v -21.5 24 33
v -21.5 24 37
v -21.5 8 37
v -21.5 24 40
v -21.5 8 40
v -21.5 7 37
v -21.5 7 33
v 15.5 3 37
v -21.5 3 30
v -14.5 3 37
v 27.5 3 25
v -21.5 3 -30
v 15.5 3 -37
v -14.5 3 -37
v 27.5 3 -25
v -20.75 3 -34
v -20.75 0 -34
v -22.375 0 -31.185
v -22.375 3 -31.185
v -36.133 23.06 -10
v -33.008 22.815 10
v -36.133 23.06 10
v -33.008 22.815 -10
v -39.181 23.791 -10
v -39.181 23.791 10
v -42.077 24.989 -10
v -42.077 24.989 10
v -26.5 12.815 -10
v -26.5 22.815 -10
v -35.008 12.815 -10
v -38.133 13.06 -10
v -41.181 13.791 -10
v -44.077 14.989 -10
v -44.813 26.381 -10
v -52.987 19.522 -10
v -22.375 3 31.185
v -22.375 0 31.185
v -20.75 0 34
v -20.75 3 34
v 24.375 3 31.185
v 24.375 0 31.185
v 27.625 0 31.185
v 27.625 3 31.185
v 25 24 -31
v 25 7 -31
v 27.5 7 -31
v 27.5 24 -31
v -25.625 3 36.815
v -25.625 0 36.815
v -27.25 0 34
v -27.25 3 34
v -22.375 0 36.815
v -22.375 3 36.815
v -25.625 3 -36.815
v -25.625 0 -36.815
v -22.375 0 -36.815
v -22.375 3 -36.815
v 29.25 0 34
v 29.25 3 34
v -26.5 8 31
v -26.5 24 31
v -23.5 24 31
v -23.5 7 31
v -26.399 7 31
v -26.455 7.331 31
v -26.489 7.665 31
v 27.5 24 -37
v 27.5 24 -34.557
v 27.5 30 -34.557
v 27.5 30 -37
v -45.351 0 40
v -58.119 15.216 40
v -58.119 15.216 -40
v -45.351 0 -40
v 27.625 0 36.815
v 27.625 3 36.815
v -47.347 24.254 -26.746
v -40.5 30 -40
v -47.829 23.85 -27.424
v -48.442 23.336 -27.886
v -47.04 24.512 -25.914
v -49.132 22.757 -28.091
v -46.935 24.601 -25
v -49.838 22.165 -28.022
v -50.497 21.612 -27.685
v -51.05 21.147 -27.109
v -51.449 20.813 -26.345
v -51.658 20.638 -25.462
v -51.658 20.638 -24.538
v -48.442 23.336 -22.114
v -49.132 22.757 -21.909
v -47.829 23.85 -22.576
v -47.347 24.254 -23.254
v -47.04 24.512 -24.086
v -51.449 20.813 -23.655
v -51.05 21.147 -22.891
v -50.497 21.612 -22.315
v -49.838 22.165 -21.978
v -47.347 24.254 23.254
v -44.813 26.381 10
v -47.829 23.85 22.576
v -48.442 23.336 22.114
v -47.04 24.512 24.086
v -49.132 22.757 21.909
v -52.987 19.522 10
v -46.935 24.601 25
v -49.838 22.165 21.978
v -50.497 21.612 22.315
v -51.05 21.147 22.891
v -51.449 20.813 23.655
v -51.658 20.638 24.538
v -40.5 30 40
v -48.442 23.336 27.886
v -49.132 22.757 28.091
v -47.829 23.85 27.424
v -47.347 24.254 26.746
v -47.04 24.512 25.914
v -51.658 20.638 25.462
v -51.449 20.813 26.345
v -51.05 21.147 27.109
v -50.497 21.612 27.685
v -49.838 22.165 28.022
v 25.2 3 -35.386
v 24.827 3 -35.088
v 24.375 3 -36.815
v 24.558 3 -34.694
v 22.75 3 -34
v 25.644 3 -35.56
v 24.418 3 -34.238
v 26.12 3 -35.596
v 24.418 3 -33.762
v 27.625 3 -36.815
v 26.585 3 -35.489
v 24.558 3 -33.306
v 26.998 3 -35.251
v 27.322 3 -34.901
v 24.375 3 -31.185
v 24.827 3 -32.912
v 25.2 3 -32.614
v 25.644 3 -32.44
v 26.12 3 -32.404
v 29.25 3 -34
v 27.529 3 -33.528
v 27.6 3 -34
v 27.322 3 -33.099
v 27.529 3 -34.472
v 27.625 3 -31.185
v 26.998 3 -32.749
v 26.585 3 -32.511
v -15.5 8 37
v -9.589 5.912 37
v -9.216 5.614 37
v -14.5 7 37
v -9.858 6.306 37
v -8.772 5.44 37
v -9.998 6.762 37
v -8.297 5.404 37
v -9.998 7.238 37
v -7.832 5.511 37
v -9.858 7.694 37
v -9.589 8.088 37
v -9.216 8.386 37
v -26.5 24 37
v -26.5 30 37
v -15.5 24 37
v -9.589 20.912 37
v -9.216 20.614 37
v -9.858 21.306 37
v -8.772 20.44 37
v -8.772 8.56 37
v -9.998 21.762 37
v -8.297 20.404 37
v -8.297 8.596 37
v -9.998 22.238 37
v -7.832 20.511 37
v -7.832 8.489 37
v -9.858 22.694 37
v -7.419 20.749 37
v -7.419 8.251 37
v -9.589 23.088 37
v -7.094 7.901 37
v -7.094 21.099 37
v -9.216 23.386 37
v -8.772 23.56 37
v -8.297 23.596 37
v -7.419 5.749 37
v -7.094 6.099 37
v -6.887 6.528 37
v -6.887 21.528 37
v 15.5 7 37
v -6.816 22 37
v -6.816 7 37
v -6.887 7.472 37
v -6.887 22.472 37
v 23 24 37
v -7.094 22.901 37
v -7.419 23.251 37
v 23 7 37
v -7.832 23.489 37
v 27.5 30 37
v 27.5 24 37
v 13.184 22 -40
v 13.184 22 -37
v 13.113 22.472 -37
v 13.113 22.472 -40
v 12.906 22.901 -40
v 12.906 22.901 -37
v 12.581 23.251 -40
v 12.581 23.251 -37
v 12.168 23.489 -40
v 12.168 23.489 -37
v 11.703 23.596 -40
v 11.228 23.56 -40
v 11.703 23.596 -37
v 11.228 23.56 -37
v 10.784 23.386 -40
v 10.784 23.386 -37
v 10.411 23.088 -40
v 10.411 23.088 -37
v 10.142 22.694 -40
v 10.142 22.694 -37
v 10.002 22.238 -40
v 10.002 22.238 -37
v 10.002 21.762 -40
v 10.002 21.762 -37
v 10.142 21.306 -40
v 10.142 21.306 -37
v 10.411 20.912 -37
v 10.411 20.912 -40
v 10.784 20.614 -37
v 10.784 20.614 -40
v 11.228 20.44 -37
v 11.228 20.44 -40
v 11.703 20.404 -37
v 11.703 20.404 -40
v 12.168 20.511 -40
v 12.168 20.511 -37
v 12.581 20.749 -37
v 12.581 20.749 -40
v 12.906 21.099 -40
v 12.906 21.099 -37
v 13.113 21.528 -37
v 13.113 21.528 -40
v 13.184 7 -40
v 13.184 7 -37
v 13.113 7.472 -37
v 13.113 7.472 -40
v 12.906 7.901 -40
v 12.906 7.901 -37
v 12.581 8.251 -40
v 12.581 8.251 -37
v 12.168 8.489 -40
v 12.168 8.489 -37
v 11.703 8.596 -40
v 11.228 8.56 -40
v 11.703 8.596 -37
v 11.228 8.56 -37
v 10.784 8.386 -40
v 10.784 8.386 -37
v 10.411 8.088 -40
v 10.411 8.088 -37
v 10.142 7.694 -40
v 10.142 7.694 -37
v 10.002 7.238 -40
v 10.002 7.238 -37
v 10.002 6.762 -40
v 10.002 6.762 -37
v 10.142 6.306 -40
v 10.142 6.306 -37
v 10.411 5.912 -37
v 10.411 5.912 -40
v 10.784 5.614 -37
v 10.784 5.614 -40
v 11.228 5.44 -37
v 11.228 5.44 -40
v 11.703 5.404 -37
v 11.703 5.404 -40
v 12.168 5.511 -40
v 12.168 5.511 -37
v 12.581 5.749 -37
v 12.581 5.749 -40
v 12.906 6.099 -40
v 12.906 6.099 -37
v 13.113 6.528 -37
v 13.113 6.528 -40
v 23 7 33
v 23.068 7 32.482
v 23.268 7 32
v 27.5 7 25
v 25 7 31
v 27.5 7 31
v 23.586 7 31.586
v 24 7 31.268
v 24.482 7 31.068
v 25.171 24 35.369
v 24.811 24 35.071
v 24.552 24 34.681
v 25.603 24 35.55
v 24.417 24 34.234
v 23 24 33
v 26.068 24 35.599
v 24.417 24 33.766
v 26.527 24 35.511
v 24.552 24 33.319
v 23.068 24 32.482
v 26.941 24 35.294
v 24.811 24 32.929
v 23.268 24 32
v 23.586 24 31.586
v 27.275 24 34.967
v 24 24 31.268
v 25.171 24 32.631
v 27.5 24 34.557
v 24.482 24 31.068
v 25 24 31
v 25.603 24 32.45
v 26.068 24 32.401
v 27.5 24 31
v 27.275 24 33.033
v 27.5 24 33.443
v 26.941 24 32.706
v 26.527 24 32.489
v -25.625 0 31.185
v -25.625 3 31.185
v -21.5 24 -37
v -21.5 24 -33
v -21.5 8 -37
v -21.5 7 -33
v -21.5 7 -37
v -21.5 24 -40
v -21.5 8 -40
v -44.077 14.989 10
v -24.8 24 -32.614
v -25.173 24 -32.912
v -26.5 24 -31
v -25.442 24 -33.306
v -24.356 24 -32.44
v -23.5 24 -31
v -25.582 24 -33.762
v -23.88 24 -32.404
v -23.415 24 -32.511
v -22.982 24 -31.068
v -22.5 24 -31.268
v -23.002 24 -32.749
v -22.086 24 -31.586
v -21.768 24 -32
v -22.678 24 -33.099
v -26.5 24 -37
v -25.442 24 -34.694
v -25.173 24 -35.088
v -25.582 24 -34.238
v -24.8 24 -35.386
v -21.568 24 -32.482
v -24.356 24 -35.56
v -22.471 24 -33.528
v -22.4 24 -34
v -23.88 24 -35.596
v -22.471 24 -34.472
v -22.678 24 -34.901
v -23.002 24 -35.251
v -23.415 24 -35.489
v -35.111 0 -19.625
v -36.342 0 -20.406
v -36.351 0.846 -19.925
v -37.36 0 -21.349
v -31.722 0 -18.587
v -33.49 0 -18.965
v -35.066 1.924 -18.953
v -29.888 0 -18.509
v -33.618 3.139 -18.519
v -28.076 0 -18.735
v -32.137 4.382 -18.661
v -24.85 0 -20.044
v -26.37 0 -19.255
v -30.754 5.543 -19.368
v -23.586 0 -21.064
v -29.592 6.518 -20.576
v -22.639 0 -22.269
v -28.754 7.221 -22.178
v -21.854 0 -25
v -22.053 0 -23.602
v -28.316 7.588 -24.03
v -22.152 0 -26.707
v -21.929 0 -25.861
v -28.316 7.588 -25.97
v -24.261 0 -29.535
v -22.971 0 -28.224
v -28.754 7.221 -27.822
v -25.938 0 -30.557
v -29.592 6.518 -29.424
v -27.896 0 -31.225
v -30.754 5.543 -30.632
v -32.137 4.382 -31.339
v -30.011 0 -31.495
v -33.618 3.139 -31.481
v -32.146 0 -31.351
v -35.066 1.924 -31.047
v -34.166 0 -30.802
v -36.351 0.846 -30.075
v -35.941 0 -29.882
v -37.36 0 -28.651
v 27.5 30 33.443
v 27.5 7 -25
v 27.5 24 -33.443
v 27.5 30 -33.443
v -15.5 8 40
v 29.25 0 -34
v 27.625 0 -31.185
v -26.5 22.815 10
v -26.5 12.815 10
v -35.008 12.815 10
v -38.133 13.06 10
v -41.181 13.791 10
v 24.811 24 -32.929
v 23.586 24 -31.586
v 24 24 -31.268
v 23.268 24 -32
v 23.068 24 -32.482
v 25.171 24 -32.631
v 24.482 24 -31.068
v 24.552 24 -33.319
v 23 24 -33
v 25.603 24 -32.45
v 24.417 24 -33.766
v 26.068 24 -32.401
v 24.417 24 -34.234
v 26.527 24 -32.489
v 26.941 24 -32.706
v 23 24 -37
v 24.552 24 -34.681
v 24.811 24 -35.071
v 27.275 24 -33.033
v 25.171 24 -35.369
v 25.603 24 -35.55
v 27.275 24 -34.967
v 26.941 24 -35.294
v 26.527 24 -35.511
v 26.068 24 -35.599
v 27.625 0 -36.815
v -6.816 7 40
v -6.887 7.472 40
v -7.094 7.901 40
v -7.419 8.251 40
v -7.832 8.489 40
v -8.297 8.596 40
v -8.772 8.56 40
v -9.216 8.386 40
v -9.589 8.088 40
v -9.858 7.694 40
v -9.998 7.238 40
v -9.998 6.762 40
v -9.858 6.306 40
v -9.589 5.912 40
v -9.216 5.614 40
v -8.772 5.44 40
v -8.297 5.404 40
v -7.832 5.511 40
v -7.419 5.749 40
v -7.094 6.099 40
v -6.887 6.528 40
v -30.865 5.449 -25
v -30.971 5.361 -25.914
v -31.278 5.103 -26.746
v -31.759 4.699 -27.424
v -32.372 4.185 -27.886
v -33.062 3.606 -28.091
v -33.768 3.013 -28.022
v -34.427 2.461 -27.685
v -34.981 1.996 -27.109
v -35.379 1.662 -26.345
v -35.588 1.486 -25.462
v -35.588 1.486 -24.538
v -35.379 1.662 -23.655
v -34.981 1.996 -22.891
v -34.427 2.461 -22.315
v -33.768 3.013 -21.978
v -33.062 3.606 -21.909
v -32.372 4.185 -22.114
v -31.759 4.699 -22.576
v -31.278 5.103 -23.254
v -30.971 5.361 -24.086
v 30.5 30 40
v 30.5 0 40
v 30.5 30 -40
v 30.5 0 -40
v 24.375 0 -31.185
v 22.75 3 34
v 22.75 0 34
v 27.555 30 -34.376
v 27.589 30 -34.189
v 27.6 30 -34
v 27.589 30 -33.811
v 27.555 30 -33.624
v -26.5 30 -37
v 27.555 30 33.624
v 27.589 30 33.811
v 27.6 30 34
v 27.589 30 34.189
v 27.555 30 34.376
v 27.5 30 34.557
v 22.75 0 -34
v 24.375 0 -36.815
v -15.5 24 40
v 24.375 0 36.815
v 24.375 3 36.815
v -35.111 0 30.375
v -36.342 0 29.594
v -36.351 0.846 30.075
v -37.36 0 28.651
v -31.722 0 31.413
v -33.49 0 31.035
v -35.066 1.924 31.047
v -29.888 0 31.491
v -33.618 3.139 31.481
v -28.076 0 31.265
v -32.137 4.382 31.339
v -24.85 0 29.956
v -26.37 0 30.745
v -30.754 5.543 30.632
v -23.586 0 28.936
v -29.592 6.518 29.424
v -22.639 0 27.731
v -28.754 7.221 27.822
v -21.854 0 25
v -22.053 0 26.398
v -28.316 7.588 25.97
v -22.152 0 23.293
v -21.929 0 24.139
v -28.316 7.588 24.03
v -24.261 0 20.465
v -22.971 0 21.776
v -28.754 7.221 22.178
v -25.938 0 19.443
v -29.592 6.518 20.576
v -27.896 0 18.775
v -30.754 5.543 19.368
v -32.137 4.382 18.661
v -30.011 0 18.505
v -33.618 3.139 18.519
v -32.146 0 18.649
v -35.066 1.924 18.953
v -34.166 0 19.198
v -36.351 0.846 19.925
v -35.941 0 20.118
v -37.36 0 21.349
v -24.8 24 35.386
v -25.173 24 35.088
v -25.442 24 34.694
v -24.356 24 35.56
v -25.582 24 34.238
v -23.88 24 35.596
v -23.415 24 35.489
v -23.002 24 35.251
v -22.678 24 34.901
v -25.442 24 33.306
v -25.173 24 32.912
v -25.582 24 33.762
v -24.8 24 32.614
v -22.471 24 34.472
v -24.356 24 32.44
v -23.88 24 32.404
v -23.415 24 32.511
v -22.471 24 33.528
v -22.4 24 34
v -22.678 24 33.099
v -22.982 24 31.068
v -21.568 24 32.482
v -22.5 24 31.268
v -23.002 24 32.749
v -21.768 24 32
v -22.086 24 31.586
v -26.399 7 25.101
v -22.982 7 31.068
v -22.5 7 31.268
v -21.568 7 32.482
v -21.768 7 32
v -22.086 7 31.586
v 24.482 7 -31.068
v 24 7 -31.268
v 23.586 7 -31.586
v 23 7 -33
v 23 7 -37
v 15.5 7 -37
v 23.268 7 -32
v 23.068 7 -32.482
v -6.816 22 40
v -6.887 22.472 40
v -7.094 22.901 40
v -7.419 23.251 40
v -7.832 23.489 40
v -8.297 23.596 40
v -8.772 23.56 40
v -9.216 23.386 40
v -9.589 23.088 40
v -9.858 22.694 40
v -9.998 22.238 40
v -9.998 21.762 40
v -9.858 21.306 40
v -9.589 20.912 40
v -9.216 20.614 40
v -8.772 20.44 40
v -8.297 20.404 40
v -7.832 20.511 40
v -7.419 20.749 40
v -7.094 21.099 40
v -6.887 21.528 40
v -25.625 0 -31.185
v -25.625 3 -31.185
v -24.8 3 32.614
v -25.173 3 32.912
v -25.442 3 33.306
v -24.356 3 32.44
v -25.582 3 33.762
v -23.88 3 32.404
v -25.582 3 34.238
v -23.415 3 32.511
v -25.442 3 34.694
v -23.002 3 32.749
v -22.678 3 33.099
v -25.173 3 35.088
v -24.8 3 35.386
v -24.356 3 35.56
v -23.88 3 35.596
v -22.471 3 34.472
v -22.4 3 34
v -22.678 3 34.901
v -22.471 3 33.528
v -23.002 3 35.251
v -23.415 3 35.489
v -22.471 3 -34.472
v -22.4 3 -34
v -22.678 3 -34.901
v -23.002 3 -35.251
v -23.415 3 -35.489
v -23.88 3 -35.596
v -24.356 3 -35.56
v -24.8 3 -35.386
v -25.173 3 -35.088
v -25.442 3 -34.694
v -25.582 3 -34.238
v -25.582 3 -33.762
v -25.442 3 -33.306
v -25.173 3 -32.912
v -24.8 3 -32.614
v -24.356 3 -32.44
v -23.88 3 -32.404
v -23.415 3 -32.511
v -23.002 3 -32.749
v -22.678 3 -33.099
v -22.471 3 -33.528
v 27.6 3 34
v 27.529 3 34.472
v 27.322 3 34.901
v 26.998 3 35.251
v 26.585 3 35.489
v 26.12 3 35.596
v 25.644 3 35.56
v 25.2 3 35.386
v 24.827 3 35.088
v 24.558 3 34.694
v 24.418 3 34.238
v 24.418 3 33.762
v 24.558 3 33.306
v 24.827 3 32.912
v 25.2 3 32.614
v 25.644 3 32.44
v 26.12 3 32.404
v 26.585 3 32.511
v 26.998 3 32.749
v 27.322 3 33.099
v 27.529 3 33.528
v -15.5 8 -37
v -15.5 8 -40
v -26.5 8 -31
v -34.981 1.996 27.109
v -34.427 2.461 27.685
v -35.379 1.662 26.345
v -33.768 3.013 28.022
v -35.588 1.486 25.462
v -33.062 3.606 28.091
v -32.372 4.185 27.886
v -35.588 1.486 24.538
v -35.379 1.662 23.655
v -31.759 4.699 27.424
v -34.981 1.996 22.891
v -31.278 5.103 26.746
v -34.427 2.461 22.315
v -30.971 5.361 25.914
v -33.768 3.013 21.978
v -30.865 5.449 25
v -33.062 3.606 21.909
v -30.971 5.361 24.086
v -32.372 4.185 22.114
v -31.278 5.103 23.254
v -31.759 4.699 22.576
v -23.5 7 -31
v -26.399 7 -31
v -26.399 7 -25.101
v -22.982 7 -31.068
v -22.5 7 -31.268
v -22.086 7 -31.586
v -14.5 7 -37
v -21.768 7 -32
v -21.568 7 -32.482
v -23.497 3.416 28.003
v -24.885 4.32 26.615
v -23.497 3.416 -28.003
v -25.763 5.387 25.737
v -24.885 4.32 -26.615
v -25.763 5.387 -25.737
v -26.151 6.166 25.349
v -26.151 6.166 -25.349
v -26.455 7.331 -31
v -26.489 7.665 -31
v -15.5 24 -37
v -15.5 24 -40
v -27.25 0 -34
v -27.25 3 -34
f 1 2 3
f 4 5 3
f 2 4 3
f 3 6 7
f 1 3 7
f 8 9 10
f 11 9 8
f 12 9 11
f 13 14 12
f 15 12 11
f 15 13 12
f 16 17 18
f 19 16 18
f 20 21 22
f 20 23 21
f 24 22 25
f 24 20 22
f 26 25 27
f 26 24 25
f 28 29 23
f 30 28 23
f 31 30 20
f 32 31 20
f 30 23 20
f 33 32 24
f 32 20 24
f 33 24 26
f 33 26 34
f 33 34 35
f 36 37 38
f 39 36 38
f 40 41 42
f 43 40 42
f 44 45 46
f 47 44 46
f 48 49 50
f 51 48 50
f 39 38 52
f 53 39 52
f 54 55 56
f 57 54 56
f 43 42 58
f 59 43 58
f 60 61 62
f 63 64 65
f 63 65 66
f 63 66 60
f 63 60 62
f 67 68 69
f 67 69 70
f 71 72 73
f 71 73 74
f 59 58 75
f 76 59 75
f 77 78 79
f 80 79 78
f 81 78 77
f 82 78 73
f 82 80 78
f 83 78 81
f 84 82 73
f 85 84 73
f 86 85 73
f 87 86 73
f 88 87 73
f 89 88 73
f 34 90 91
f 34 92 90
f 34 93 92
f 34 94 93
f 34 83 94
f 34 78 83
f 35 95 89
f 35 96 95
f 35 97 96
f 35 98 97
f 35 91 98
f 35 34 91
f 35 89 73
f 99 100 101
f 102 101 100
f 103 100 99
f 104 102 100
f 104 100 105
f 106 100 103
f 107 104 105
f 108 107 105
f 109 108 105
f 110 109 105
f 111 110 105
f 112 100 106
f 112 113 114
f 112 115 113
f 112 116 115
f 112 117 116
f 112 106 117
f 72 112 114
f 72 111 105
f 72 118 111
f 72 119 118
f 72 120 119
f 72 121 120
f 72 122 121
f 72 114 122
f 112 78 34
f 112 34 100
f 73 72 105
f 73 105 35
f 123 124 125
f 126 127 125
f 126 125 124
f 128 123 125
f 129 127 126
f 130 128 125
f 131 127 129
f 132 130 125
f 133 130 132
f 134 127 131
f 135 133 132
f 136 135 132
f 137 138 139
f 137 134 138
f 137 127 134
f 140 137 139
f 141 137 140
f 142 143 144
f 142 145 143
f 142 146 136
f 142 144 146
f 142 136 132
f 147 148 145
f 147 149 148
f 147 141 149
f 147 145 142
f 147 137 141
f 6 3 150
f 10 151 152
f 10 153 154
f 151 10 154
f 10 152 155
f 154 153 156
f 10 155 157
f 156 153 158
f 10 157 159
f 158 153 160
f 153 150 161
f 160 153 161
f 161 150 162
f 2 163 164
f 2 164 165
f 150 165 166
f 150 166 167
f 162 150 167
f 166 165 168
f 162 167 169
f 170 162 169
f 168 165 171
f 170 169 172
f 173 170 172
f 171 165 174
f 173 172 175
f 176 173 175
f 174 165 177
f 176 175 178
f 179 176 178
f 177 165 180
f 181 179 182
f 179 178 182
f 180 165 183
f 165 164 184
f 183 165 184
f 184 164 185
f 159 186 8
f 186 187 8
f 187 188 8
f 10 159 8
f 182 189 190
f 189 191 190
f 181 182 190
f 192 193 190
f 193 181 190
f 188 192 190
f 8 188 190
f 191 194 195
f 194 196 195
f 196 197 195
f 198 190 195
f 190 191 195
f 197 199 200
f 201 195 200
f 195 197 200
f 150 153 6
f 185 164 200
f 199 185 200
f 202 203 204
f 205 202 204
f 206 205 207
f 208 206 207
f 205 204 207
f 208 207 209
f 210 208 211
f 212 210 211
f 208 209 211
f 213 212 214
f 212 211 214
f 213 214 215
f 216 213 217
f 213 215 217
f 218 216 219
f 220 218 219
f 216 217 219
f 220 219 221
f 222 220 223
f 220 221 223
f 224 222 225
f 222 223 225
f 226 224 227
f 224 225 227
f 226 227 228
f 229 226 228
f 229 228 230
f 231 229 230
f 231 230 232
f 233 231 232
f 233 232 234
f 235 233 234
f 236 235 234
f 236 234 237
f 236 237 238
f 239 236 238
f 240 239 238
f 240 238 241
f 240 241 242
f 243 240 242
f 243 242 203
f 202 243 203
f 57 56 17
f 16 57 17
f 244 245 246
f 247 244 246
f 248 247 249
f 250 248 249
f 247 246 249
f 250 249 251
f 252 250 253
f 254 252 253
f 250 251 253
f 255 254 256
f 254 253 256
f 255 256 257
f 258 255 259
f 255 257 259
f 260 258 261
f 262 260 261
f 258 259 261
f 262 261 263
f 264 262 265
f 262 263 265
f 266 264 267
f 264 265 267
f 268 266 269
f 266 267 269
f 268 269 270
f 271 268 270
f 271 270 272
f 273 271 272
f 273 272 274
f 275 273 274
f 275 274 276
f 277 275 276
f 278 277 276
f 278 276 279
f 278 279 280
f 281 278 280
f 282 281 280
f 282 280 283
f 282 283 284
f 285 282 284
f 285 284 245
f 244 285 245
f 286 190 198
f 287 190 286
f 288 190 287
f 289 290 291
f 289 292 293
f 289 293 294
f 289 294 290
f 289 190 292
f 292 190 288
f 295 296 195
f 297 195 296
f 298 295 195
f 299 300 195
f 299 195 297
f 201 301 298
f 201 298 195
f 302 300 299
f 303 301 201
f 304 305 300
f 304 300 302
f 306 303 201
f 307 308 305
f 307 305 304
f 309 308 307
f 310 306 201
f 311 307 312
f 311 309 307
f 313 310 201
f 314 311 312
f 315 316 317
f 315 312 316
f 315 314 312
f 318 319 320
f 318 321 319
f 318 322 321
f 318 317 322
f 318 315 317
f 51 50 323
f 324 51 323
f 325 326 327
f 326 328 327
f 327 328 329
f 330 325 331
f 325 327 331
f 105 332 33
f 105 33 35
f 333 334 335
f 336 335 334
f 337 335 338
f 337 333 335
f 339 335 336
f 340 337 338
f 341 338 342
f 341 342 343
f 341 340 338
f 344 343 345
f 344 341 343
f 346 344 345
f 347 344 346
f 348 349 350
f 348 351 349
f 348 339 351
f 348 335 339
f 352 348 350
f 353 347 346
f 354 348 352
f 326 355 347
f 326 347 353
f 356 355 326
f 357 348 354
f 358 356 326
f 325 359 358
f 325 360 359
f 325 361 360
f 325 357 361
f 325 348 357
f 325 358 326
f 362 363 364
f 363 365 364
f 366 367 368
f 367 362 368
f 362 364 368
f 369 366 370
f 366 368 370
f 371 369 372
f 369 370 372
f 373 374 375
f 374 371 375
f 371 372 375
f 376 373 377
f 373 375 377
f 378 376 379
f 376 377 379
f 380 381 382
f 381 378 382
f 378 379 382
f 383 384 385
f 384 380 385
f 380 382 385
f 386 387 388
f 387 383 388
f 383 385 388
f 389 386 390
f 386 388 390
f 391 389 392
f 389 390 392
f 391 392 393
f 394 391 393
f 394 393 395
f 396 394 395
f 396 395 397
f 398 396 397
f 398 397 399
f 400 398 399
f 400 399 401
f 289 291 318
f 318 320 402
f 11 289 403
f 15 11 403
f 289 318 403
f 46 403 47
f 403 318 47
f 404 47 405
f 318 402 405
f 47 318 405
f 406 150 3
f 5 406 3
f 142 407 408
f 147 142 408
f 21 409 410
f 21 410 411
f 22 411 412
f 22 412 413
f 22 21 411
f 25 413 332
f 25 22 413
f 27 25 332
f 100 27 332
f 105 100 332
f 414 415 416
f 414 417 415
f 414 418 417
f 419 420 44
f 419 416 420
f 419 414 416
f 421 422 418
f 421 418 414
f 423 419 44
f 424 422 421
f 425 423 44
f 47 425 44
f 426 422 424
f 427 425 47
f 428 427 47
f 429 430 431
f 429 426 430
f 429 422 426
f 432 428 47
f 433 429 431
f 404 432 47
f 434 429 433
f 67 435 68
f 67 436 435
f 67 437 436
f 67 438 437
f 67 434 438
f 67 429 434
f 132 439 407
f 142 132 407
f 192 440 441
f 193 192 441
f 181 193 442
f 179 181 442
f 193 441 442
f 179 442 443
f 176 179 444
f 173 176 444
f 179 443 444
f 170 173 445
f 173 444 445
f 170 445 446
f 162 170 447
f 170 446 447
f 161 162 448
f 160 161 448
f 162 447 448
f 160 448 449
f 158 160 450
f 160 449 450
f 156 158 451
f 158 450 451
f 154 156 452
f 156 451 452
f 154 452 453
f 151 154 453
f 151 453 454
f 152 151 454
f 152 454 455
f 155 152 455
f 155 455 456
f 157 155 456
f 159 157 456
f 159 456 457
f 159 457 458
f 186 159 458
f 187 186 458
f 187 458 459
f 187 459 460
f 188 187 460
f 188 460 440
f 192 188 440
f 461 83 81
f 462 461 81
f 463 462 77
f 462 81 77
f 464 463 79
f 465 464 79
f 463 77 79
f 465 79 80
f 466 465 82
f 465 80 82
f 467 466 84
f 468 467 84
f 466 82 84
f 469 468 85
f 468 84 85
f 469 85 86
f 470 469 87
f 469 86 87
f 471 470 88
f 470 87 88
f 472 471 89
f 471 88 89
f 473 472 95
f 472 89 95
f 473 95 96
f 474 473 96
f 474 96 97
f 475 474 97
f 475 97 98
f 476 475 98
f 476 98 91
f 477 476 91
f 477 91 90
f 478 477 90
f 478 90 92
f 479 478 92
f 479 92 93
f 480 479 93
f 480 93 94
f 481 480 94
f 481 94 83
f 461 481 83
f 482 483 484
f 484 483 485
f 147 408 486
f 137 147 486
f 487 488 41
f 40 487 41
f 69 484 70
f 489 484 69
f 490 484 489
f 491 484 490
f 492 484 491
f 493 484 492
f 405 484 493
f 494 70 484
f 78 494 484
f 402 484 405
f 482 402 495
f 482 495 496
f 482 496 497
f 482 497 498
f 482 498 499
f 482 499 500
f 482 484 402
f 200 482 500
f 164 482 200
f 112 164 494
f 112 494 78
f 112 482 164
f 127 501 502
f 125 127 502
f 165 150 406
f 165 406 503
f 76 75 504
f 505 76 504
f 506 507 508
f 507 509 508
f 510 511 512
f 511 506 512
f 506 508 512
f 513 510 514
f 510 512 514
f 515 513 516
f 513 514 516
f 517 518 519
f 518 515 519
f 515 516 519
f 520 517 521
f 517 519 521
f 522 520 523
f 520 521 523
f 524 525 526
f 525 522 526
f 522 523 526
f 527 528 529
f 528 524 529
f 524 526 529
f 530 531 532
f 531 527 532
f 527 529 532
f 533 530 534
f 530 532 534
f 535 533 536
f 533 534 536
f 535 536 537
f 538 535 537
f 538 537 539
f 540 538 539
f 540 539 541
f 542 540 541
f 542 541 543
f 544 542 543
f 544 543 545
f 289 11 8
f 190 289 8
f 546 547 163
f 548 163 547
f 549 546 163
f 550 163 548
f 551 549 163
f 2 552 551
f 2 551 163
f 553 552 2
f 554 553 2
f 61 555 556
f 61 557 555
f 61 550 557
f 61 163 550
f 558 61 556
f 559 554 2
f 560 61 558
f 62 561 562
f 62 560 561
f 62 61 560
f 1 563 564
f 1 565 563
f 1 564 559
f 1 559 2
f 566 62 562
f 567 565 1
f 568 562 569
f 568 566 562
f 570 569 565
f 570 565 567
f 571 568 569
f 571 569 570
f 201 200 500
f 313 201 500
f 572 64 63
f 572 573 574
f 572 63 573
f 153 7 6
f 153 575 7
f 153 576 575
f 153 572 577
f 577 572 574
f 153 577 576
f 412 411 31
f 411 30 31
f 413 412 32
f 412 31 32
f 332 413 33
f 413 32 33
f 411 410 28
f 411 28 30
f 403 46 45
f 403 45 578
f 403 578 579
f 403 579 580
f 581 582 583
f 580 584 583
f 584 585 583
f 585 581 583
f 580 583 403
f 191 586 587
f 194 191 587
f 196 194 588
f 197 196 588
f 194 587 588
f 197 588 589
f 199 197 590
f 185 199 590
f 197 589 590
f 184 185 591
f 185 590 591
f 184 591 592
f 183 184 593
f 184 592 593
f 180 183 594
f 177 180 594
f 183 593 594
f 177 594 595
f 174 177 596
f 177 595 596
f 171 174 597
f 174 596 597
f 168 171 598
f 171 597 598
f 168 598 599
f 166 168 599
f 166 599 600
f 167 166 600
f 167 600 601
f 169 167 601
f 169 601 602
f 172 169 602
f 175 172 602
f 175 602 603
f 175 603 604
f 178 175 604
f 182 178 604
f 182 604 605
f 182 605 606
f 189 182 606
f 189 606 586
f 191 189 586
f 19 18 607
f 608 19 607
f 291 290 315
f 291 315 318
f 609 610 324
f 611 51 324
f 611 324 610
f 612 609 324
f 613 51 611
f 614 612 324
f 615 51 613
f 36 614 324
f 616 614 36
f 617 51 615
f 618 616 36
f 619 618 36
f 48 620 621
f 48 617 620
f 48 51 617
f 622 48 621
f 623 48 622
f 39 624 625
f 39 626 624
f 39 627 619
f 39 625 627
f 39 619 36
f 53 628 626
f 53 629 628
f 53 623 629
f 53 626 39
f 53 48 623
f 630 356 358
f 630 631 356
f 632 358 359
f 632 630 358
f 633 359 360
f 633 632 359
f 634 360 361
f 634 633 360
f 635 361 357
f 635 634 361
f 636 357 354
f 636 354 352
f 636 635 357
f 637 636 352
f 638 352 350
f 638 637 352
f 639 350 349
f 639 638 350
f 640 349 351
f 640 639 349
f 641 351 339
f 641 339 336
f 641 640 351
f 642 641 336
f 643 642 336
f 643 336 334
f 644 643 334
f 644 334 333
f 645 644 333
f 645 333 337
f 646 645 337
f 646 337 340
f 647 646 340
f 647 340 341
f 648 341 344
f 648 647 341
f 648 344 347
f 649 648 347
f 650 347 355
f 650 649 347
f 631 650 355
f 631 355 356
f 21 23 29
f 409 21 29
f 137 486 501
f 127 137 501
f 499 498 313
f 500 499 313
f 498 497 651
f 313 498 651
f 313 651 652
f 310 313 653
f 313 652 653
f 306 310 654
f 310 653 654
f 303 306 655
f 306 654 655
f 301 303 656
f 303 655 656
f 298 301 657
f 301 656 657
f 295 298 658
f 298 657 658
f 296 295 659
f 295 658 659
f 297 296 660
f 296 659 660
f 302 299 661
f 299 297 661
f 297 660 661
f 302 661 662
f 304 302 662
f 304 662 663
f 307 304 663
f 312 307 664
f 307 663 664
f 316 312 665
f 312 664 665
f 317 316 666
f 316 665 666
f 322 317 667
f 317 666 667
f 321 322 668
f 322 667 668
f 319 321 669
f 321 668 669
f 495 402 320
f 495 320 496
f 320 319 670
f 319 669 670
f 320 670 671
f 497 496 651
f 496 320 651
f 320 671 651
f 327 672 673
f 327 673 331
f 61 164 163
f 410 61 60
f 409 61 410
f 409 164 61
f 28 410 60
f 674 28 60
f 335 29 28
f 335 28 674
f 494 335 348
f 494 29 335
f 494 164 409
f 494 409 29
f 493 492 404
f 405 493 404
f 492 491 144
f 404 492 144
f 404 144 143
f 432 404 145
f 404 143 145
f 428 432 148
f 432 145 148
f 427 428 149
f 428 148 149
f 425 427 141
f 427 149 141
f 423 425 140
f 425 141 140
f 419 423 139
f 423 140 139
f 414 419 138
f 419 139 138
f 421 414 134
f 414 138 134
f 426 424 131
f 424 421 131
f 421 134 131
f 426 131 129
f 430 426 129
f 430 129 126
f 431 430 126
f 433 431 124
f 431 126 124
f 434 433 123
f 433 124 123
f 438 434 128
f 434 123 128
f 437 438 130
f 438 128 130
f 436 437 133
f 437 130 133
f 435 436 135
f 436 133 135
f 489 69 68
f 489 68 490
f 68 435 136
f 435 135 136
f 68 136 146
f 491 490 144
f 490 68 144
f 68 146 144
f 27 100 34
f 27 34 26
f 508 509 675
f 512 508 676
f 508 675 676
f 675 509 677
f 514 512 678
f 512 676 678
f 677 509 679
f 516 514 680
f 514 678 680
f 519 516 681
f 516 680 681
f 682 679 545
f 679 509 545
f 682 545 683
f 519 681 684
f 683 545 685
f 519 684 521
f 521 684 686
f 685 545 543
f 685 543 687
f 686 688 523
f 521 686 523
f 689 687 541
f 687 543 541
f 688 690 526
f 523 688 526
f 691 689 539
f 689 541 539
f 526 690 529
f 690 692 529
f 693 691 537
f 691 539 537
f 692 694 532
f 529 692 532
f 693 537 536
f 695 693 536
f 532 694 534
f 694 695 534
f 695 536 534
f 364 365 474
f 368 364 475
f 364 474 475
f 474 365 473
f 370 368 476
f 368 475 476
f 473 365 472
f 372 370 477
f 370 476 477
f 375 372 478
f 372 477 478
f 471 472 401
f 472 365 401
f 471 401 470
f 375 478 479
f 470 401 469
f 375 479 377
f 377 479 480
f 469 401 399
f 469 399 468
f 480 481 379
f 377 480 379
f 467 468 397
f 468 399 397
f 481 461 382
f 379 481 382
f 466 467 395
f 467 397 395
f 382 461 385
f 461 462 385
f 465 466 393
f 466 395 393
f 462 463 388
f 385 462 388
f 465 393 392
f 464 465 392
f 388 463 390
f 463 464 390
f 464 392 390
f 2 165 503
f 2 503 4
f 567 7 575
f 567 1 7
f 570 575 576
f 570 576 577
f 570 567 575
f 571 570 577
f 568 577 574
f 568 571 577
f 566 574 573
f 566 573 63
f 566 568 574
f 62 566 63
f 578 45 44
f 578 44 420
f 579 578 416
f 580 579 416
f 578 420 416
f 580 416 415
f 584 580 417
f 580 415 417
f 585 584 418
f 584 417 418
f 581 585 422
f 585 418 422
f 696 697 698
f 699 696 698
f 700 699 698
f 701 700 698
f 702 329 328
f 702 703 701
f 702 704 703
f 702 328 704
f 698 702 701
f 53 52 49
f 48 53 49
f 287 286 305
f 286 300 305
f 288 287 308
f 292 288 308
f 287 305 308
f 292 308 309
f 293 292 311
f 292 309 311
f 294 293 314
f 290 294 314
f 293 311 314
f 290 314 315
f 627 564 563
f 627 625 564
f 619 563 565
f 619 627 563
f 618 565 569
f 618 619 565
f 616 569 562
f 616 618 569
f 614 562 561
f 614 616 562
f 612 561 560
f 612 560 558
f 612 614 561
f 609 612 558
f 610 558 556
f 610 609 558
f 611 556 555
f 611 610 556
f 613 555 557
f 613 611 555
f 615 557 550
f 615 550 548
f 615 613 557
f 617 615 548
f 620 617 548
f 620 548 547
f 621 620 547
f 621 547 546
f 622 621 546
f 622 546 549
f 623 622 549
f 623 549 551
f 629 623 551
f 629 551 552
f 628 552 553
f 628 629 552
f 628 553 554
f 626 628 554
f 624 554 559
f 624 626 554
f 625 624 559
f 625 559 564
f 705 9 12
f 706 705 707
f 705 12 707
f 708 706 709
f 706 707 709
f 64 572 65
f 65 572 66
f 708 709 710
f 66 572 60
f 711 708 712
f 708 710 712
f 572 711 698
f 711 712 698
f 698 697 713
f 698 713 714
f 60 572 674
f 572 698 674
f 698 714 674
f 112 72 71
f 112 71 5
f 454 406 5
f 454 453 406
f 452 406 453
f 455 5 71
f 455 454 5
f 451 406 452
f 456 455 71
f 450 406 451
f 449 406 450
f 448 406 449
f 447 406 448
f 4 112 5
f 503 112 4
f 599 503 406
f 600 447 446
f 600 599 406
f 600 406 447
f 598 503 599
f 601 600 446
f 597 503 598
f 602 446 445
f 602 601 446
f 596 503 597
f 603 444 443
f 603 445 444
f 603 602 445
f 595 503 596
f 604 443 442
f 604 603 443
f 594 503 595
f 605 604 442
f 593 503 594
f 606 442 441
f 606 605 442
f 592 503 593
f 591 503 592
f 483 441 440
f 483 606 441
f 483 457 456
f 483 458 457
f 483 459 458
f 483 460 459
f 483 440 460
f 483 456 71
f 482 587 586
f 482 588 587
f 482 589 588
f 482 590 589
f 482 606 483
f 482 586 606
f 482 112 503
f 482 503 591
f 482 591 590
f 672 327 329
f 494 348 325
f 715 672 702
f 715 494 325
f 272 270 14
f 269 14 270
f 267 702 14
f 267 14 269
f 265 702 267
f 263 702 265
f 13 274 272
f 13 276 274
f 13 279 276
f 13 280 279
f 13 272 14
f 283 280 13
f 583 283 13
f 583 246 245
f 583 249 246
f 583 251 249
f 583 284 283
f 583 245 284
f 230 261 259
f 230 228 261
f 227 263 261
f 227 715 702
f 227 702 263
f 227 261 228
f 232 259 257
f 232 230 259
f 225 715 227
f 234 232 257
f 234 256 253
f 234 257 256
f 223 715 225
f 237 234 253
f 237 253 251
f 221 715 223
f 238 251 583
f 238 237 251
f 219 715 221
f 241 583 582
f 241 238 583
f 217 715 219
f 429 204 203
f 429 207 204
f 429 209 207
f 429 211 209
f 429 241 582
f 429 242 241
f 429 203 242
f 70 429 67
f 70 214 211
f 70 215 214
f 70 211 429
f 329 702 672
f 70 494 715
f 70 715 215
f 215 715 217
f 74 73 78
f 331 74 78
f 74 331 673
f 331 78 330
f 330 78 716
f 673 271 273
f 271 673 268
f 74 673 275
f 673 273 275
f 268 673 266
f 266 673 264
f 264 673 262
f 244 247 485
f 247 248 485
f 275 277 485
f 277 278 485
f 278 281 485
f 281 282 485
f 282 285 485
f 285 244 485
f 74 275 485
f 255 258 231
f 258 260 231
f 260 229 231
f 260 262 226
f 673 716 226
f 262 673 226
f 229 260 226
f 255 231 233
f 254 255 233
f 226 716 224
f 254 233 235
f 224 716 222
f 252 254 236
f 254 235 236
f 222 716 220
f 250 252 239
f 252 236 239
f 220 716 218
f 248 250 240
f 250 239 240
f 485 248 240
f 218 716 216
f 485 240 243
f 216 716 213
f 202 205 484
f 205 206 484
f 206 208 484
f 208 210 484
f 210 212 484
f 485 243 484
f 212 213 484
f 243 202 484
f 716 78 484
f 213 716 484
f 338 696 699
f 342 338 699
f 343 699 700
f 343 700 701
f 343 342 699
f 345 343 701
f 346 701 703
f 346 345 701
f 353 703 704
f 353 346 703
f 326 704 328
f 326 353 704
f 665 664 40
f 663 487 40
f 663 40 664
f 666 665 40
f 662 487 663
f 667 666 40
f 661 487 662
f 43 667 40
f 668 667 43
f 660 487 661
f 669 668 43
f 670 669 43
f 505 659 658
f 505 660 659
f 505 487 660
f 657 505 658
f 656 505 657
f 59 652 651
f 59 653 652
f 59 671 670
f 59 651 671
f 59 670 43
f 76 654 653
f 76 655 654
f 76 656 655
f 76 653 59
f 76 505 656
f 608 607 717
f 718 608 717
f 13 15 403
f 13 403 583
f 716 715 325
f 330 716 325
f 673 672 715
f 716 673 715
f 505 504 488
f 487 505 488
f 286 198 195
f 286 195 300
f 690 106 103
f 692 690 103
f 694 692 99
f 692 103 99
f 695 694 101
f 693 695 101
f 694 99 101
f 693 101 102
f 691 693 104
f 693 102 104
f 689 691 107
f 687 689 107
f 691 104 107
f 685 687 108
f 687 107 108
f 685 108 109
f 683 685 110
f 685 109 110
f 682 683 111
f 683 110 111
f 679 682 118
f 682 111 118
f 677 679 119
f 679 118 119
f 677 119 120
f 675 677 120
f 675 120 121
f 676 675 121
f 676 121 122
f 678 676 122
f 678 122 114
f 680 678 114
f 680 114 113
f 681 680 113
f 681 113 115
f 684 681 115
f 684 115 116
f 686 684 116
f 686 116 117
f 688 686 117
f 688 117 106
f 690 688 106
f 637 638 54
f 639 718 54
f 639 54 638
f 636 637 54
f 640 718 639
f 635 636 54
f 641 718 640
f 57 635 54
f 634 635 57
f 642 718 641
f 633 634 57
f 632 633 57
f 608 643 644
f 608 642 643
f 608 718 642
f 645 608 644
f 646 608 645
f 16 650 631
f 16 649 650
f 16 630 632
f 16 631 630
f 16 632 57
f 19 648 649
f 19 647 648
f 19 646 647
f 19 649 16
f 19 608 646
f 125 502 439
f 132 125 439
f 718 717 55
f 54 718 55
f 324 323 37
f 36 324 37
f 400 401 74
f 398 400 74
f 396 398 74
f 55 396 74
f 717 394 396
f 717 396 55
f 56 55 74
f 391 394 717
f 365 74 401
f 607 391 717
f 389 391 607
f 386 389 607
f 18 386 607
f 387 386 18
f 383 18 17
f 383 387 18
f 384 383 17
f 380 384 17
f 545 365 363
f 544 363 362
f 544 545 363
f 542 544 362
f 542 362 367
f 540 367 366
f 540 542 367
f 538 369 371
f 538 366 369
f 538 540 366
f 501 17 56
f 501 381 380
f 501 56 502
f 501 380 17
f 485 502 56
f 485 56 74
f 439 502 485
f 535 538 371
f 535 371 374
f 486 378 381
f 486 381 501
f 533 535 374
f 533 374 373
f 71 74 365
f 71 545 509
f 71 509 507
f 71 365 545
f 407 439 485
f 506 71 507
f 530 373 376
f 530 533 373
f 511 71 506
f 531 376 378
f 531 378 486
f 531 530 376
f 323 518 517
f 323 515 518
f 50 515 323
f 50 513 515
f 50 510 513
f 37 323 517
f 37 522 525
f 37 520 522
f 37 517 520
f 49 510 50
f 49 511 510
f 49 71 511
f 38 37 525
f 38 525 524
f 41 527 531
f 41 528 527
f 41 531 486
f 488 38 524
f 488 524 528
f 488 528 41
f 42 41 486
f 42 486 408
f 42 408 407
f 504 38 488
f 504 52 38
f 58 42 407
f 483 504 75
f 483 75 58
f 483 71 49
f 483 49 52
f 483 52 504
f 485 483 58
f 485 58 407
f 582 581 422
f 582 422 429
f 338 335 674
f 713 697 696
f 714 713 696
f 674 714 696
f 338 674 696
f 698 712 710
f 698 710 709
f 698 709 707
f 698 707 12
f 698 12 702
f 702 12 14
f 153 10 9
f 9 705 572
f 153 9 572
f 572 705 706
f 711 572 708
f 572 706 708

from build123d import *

# Parameters (mm, degrees)
SKETCH1_W                = 61
SKETCH1_H                = 80
BOSS_EXTRUDE1_DEPTH      = 30
SKETCH2_W                = 54
SKETCH2_H                = 74
CUT_EXTRUDE1_DEPTH       = 27
BOSS_EXTRUDE3_DEPTH      = 80
BOSS_EXTRUDE2_DEPTH      = 4
SKETCH5_R                = 1.6
CUT_EXTRUDE3_DEPTH       = 31
CUT_EXTRUDE4_DEPTH       = 3
CUT_EXTRUDE6_DEPTH       = 81
SKETCH16_R               = 3.1
CUT_EXTRUDE8_DEPTH       = 69.619253581
FILLET1_R                = 5
CUT_EXTRUDE9_START       = -25
SKETCH17_R               = 6.5
CUT_EXTRUDE9_DEPTH       = 10
CUT_EXTRUDE10_START      = -30
CUT_EXTRUDE10_DEPTH      = 20
FILLET2_R                = 20
CUT_EXTRUDE11_REACH      = 82
SKETCH19_R               = 1.6
SKETCH20_W               = 6
SKETCH20_H               = 16
CUT_EXTRUDE12_DEPTH      = 78
CUT_EXTRUDE12_DEPTH_BACK = 4
SKETCH21_W               = 5
SKETCH21_H               = 6
SKETCH21_R               = 1.6
SKETCH21_W_2             = 6
BOSS_EXTRUDE4_DEPTH      = 17
FILLET4_R                = 2
CUT_EXTRUDE13_START      = -77
SKETCH22_R               = 1.6
CUT_EXTRUDE13_DEPTH      = 4


with BuildPart() as part:
    # Sketch1 → Boss-Extrude1 (new body)
    with BuildSketch(Plane(origin=(0, 0, 0), x_dir=(1, 0, 0), z_dir=(0, 1, 0))):
        Rectangle(SKETCH1_W, SKETCH1_H)
    extrude(amount=BOSS_EXTRUDE1_DEPTH)

    # Sketch2 → Cut-Extrude1 (cut)
    with BuildSketch(Plane(origin=(0, 30, 0), x_dir=(1, 0, 0), z_dir=(0, 1, 0))):
        with Locations((0.5, 0)):
            Rectangle(SKETCH2_W, SKETCH2_H)
    extrude(amount=-CUT_EXTRUDE1_DEPTH, mode=Mode.SUBTRACT)

    # Sketch11 → Boss-Extrude3 (add)
    with BuildSketch(Plane.XY.offset(40)):
        Polygon((-30.5, 30), (-40.5, 30), (-58.119022192, 15.215884977), (-58.119022192, 0), (-30.5, 0), align=None)
    extrude(amount=-BOSS_EXTRUDE3_DEPTH)

    # Sketch7 → Boss-Extrude2 (add)
    with BuildSketch(Plane(origin=(0, 3, 0), x_dir=(1, 0, 0), z_dir=(0, 1, 0))):
        Polygon((27.5, -25), (15.5, -37), (27.5, -37), align=None)
        Polygon((27.5, 25), (15.5, 37), (27.5, 37), align=None)
        Polygon((-26.5, 25), (-14.5, 37), (-26.5, 37), align=None)
        Polygon((-14.5, -37), (-26.5, -25), (-26.5, -37), align=None)
    extrude(amount=BOSS_EXTRUDE2_DEPTH)

    # Sketch5 → Cut-Extrude3 (cut, through all)
    with BuildSketch(Plane.XZ):
        with Locations((-24, -34)):
            Circle(SKETCH5_R)
        with Locations((-24, 34)):
            Circle(SKETCH5_R)
        with Locations((26, 34)):
            Circle(SKETCH5_R)
        with Locations((26, -34)):
            Circle(SKETCH5_R)
    extrude(amount=-CUT_EXTRUDE3_DEPTH, mode=Mode.SUBTRACT)

    # Sketch8 → Cut-Extrude4 (cut)
    with BuildSketch(Plane.XZ):
        Polygon((-25.625, 36.814582562), (-27.25, 34), (-25.625, 31.185417438), (-22.375, 31.185417438), (-20.75, 34), (-22.375, 36.814582562), align=None)
        Polygon((24.375, 36.814582562), (22.75, 34), (24.375, 31.185417438), (27.625, 31.185417438), (29.25, 34), (27.625, 36.814582562), align=None)
        Polygon((-25.625, -31.185417438), (-27.25, -34), (-25.625, -36.814582562), (-22.375, -36.814582562), (-20.75, -34), (-22.375, -31.185417438), align=None)
        Polygon((24.375, -31.185417438), (22.75, -34), (24.375, -36.814582562), (27.625, -36.814582562), (29.25, -34), (27.625, -31.185417438), align=None)
    extrude(amount=-CUT_EXTRUDE4_DEPTH, mode=Mode.SUBTRACT)

    # Sketch12 → Cut-Extrude6 (cut, through all)
    with BuildSketch(Plane.XY.offset(40)):
        Polygon((-58.119022192, 15.215884977), (-45.351378719, 0), (-58.119022192, 0), align=None)
    extrude(amount=-CUT_EXTRUDE6_DEPTH, mode=Mode.SUBTRACT)

    # Sketch16 → Cut-Extrude8 (cut, through all)
    with BuildSketch(Plane(origin=(-31.505740697, 37.547079664, 0), x_dir=(0.766044443, 0.64278761, 0), z_dir=(-0.64278761, 0.766044443, 0))):
        with Locations((-23.241171656, 25)):
            Circle(SKETCH16_R)
        with Locations((-23.241171656, -25)):
            Circle(SKETCH16_R)
    extrude(amount=-CUT_EXTRUDE8_DEPTH, mode=Mode.SUBTRACT)

    # Fillet1
    fillet1_edges = [part.edges().sort_by_distance(p)[0] for p in [
        (-26.5, 3, 0),
    ]]
    fillet(fillet1_edges, radius=FILLET1_R)

    # Sketch17 → Cut-Extrude9 (cut)
    with BuildSketch(Plane(origin=(-31.505740697, 37.547079664, 0), x_dir=(0.766044443, 0.64278761, 0), z_dir=(-0.64278761, 0.766044443, 0)).offset(CUT_EXTRUDE9_START)):
        with Locations((-23.241171656, -25)):
            Circle(SKETCH17_R)
        with Locations((-23.241171656, 25)):
            Circle(SKETCH17_R)
    extrude(amount=-CUT_EXTRUDE9_DEPTH, mode=Mode.SUBTRACT)

    # Sketch18 → Cut-Extrude10 (cut)
    with BuildSketch(Plane.XY.offset(40).offset(CUT_EXTRUDE10_START)):
        Polygon((-44.812844495, 26.381093775), (-37.803211847, 22.814854282), (-23.803211847, 22.814854282), (-23.803211847, 12.814854282), (-39.803211847, 12.814854282), (-52.986917817, 19.522231865), align=None)
    extrude(amount=-CUT_EXTRUDE10_DEPTH, mode=Mode.SUBTRACT)

    # Fillet2
    fillet2_edges = [part.edges().sort_by_distance(p)[0] for p in [
        (-37.803211847, 22.814854282, 0),
        (-39.803211847, 12.814854282, 0),
    ]]
    fillet(fillet2_edges, radius=FILLET2_R)

    # Sketch19 → Cut-Extrude11 (cut, up to next)
    with BuildSketch(Plane.XY.offset(40), mode=Mode.PRIVATE) as cut_extrude11_sk1:
        with Locations((-8.416221869, 22)):
            Circle(SKETCH19_R)
    cut_extrude11_tool1 = extrude(cut_extrude11_sk1.sketch, amount=-CUT_EXTRUDE11_REACH, mode=Mode.PRIVATE) & part.part
    add(cut_extrude11_tool1.solids().sort_by_distance((-8.416222, 22, 40))[0], mode=Mode.SUBTRACT)
    # Sketch19 → Cut-Extrude11 (cut, up to next)
    with BuildSketch(Plane.XY.offset(40), mode=Mode.PRIVATE) as cut_extrude11_sk2:
        with Locations((-8.416221869, 7)):
            Circle(SKETCH19_R)
    cut_extrude11_tool2 = extrude(cut_extrude11_sk2.sketch, amount=-CUT_EXTRUDE11_REACH, mode=Mode.PRIVATE) & part.part
    add(cut_extrude11_tool2.solids().sort_by_distance((-8.416222, 7, 40))[0], mode=Mode.SUBTRACT)

    # Sketch20 → Cut-Extrude12 (cut, two sides)
    with BuildSketch(Plane(origin=(0, 0, 37), x_dir=(-1, 0, 0), z_dir=(0, 0, -1))) as cut_extrude12_sk:
        with Locations((18.5, 16)):
            Rectangle(SKETCH20_W, SKETCH20_H)
    extrude(amount=CUT_EXTRUDE12_DEPTH, mode=Mode.SUBTRACT)
    extrude(cut_extrude12_sk.sketch, amount=-CUT_EXTRUDE12_DEPTH_BACK, mode=Mode.SUBTRACT)

    # Sketch21 → Boss-Extrude4 (add)
    with BuildSketch(Plane(origin=(0, 7, 0), x_dir=(1, 0, 0), z_dir=(0, 1, 0))):
        with Locations((-24, -34)):
            Rectangle(SKETCH21_W, SKETCH21_H)
        with Locations((-24, -34)):
            Circle(SKETCH21_R, mode=Mode.SUBTRACT)
        with Locations((-24, 34)):
            Rectangle(SKETCH21_W, SKETCH21_H)
        with Locations((-24, 34)):
            Circle(SKETCH21_R, mode=Mode.SUBTRACT)
        with Locations((26, 34)):
            Rectangle(SKETCH21_W_2, SKETCH21_H)
        with Locations((26, 34)):
            Circle(SKETCH21_R, mode=Mode.SUBTRACT)
        with Locations((26, -34)):
            Rectangle(SKETCH21_W_2, SKETCH21_H)
        with Locations((26, -34)):
            Circle(SKETCH21_R, mode=Mode.SUBTRACT)
    extrude(amount=BOSS_EXTRUDE4_DEPTH)

    # Fillet4
    fillet4_edges = [part.edges().sort_by_distance(p)[0] for p in [
        (-21.5, 15.5, 31),
        (-21.5, 15.5, -31),
        (23, 15.5, -31),
        (23, 15.5, 31),
    ]]
    fillet(fillet4_edges, radius=FILLET4_R)

    # Sketch22 → Cut-Extrude13 (cut, through all)
    with BuildSketch(Plane.XY.offset(40).offset(CUT_EXTRUDE13_START)):
        with Locations((11.583778131, 22)):
            Circle(SKETCH22_R)
        with Locations((11.583778131, 7)):
            Circle(SKETCH22_R)
    extrude(amount=-CUT_EXTRUDE13_DEPTH, mode=Mode.SUBTRACT)


solid = part.part
